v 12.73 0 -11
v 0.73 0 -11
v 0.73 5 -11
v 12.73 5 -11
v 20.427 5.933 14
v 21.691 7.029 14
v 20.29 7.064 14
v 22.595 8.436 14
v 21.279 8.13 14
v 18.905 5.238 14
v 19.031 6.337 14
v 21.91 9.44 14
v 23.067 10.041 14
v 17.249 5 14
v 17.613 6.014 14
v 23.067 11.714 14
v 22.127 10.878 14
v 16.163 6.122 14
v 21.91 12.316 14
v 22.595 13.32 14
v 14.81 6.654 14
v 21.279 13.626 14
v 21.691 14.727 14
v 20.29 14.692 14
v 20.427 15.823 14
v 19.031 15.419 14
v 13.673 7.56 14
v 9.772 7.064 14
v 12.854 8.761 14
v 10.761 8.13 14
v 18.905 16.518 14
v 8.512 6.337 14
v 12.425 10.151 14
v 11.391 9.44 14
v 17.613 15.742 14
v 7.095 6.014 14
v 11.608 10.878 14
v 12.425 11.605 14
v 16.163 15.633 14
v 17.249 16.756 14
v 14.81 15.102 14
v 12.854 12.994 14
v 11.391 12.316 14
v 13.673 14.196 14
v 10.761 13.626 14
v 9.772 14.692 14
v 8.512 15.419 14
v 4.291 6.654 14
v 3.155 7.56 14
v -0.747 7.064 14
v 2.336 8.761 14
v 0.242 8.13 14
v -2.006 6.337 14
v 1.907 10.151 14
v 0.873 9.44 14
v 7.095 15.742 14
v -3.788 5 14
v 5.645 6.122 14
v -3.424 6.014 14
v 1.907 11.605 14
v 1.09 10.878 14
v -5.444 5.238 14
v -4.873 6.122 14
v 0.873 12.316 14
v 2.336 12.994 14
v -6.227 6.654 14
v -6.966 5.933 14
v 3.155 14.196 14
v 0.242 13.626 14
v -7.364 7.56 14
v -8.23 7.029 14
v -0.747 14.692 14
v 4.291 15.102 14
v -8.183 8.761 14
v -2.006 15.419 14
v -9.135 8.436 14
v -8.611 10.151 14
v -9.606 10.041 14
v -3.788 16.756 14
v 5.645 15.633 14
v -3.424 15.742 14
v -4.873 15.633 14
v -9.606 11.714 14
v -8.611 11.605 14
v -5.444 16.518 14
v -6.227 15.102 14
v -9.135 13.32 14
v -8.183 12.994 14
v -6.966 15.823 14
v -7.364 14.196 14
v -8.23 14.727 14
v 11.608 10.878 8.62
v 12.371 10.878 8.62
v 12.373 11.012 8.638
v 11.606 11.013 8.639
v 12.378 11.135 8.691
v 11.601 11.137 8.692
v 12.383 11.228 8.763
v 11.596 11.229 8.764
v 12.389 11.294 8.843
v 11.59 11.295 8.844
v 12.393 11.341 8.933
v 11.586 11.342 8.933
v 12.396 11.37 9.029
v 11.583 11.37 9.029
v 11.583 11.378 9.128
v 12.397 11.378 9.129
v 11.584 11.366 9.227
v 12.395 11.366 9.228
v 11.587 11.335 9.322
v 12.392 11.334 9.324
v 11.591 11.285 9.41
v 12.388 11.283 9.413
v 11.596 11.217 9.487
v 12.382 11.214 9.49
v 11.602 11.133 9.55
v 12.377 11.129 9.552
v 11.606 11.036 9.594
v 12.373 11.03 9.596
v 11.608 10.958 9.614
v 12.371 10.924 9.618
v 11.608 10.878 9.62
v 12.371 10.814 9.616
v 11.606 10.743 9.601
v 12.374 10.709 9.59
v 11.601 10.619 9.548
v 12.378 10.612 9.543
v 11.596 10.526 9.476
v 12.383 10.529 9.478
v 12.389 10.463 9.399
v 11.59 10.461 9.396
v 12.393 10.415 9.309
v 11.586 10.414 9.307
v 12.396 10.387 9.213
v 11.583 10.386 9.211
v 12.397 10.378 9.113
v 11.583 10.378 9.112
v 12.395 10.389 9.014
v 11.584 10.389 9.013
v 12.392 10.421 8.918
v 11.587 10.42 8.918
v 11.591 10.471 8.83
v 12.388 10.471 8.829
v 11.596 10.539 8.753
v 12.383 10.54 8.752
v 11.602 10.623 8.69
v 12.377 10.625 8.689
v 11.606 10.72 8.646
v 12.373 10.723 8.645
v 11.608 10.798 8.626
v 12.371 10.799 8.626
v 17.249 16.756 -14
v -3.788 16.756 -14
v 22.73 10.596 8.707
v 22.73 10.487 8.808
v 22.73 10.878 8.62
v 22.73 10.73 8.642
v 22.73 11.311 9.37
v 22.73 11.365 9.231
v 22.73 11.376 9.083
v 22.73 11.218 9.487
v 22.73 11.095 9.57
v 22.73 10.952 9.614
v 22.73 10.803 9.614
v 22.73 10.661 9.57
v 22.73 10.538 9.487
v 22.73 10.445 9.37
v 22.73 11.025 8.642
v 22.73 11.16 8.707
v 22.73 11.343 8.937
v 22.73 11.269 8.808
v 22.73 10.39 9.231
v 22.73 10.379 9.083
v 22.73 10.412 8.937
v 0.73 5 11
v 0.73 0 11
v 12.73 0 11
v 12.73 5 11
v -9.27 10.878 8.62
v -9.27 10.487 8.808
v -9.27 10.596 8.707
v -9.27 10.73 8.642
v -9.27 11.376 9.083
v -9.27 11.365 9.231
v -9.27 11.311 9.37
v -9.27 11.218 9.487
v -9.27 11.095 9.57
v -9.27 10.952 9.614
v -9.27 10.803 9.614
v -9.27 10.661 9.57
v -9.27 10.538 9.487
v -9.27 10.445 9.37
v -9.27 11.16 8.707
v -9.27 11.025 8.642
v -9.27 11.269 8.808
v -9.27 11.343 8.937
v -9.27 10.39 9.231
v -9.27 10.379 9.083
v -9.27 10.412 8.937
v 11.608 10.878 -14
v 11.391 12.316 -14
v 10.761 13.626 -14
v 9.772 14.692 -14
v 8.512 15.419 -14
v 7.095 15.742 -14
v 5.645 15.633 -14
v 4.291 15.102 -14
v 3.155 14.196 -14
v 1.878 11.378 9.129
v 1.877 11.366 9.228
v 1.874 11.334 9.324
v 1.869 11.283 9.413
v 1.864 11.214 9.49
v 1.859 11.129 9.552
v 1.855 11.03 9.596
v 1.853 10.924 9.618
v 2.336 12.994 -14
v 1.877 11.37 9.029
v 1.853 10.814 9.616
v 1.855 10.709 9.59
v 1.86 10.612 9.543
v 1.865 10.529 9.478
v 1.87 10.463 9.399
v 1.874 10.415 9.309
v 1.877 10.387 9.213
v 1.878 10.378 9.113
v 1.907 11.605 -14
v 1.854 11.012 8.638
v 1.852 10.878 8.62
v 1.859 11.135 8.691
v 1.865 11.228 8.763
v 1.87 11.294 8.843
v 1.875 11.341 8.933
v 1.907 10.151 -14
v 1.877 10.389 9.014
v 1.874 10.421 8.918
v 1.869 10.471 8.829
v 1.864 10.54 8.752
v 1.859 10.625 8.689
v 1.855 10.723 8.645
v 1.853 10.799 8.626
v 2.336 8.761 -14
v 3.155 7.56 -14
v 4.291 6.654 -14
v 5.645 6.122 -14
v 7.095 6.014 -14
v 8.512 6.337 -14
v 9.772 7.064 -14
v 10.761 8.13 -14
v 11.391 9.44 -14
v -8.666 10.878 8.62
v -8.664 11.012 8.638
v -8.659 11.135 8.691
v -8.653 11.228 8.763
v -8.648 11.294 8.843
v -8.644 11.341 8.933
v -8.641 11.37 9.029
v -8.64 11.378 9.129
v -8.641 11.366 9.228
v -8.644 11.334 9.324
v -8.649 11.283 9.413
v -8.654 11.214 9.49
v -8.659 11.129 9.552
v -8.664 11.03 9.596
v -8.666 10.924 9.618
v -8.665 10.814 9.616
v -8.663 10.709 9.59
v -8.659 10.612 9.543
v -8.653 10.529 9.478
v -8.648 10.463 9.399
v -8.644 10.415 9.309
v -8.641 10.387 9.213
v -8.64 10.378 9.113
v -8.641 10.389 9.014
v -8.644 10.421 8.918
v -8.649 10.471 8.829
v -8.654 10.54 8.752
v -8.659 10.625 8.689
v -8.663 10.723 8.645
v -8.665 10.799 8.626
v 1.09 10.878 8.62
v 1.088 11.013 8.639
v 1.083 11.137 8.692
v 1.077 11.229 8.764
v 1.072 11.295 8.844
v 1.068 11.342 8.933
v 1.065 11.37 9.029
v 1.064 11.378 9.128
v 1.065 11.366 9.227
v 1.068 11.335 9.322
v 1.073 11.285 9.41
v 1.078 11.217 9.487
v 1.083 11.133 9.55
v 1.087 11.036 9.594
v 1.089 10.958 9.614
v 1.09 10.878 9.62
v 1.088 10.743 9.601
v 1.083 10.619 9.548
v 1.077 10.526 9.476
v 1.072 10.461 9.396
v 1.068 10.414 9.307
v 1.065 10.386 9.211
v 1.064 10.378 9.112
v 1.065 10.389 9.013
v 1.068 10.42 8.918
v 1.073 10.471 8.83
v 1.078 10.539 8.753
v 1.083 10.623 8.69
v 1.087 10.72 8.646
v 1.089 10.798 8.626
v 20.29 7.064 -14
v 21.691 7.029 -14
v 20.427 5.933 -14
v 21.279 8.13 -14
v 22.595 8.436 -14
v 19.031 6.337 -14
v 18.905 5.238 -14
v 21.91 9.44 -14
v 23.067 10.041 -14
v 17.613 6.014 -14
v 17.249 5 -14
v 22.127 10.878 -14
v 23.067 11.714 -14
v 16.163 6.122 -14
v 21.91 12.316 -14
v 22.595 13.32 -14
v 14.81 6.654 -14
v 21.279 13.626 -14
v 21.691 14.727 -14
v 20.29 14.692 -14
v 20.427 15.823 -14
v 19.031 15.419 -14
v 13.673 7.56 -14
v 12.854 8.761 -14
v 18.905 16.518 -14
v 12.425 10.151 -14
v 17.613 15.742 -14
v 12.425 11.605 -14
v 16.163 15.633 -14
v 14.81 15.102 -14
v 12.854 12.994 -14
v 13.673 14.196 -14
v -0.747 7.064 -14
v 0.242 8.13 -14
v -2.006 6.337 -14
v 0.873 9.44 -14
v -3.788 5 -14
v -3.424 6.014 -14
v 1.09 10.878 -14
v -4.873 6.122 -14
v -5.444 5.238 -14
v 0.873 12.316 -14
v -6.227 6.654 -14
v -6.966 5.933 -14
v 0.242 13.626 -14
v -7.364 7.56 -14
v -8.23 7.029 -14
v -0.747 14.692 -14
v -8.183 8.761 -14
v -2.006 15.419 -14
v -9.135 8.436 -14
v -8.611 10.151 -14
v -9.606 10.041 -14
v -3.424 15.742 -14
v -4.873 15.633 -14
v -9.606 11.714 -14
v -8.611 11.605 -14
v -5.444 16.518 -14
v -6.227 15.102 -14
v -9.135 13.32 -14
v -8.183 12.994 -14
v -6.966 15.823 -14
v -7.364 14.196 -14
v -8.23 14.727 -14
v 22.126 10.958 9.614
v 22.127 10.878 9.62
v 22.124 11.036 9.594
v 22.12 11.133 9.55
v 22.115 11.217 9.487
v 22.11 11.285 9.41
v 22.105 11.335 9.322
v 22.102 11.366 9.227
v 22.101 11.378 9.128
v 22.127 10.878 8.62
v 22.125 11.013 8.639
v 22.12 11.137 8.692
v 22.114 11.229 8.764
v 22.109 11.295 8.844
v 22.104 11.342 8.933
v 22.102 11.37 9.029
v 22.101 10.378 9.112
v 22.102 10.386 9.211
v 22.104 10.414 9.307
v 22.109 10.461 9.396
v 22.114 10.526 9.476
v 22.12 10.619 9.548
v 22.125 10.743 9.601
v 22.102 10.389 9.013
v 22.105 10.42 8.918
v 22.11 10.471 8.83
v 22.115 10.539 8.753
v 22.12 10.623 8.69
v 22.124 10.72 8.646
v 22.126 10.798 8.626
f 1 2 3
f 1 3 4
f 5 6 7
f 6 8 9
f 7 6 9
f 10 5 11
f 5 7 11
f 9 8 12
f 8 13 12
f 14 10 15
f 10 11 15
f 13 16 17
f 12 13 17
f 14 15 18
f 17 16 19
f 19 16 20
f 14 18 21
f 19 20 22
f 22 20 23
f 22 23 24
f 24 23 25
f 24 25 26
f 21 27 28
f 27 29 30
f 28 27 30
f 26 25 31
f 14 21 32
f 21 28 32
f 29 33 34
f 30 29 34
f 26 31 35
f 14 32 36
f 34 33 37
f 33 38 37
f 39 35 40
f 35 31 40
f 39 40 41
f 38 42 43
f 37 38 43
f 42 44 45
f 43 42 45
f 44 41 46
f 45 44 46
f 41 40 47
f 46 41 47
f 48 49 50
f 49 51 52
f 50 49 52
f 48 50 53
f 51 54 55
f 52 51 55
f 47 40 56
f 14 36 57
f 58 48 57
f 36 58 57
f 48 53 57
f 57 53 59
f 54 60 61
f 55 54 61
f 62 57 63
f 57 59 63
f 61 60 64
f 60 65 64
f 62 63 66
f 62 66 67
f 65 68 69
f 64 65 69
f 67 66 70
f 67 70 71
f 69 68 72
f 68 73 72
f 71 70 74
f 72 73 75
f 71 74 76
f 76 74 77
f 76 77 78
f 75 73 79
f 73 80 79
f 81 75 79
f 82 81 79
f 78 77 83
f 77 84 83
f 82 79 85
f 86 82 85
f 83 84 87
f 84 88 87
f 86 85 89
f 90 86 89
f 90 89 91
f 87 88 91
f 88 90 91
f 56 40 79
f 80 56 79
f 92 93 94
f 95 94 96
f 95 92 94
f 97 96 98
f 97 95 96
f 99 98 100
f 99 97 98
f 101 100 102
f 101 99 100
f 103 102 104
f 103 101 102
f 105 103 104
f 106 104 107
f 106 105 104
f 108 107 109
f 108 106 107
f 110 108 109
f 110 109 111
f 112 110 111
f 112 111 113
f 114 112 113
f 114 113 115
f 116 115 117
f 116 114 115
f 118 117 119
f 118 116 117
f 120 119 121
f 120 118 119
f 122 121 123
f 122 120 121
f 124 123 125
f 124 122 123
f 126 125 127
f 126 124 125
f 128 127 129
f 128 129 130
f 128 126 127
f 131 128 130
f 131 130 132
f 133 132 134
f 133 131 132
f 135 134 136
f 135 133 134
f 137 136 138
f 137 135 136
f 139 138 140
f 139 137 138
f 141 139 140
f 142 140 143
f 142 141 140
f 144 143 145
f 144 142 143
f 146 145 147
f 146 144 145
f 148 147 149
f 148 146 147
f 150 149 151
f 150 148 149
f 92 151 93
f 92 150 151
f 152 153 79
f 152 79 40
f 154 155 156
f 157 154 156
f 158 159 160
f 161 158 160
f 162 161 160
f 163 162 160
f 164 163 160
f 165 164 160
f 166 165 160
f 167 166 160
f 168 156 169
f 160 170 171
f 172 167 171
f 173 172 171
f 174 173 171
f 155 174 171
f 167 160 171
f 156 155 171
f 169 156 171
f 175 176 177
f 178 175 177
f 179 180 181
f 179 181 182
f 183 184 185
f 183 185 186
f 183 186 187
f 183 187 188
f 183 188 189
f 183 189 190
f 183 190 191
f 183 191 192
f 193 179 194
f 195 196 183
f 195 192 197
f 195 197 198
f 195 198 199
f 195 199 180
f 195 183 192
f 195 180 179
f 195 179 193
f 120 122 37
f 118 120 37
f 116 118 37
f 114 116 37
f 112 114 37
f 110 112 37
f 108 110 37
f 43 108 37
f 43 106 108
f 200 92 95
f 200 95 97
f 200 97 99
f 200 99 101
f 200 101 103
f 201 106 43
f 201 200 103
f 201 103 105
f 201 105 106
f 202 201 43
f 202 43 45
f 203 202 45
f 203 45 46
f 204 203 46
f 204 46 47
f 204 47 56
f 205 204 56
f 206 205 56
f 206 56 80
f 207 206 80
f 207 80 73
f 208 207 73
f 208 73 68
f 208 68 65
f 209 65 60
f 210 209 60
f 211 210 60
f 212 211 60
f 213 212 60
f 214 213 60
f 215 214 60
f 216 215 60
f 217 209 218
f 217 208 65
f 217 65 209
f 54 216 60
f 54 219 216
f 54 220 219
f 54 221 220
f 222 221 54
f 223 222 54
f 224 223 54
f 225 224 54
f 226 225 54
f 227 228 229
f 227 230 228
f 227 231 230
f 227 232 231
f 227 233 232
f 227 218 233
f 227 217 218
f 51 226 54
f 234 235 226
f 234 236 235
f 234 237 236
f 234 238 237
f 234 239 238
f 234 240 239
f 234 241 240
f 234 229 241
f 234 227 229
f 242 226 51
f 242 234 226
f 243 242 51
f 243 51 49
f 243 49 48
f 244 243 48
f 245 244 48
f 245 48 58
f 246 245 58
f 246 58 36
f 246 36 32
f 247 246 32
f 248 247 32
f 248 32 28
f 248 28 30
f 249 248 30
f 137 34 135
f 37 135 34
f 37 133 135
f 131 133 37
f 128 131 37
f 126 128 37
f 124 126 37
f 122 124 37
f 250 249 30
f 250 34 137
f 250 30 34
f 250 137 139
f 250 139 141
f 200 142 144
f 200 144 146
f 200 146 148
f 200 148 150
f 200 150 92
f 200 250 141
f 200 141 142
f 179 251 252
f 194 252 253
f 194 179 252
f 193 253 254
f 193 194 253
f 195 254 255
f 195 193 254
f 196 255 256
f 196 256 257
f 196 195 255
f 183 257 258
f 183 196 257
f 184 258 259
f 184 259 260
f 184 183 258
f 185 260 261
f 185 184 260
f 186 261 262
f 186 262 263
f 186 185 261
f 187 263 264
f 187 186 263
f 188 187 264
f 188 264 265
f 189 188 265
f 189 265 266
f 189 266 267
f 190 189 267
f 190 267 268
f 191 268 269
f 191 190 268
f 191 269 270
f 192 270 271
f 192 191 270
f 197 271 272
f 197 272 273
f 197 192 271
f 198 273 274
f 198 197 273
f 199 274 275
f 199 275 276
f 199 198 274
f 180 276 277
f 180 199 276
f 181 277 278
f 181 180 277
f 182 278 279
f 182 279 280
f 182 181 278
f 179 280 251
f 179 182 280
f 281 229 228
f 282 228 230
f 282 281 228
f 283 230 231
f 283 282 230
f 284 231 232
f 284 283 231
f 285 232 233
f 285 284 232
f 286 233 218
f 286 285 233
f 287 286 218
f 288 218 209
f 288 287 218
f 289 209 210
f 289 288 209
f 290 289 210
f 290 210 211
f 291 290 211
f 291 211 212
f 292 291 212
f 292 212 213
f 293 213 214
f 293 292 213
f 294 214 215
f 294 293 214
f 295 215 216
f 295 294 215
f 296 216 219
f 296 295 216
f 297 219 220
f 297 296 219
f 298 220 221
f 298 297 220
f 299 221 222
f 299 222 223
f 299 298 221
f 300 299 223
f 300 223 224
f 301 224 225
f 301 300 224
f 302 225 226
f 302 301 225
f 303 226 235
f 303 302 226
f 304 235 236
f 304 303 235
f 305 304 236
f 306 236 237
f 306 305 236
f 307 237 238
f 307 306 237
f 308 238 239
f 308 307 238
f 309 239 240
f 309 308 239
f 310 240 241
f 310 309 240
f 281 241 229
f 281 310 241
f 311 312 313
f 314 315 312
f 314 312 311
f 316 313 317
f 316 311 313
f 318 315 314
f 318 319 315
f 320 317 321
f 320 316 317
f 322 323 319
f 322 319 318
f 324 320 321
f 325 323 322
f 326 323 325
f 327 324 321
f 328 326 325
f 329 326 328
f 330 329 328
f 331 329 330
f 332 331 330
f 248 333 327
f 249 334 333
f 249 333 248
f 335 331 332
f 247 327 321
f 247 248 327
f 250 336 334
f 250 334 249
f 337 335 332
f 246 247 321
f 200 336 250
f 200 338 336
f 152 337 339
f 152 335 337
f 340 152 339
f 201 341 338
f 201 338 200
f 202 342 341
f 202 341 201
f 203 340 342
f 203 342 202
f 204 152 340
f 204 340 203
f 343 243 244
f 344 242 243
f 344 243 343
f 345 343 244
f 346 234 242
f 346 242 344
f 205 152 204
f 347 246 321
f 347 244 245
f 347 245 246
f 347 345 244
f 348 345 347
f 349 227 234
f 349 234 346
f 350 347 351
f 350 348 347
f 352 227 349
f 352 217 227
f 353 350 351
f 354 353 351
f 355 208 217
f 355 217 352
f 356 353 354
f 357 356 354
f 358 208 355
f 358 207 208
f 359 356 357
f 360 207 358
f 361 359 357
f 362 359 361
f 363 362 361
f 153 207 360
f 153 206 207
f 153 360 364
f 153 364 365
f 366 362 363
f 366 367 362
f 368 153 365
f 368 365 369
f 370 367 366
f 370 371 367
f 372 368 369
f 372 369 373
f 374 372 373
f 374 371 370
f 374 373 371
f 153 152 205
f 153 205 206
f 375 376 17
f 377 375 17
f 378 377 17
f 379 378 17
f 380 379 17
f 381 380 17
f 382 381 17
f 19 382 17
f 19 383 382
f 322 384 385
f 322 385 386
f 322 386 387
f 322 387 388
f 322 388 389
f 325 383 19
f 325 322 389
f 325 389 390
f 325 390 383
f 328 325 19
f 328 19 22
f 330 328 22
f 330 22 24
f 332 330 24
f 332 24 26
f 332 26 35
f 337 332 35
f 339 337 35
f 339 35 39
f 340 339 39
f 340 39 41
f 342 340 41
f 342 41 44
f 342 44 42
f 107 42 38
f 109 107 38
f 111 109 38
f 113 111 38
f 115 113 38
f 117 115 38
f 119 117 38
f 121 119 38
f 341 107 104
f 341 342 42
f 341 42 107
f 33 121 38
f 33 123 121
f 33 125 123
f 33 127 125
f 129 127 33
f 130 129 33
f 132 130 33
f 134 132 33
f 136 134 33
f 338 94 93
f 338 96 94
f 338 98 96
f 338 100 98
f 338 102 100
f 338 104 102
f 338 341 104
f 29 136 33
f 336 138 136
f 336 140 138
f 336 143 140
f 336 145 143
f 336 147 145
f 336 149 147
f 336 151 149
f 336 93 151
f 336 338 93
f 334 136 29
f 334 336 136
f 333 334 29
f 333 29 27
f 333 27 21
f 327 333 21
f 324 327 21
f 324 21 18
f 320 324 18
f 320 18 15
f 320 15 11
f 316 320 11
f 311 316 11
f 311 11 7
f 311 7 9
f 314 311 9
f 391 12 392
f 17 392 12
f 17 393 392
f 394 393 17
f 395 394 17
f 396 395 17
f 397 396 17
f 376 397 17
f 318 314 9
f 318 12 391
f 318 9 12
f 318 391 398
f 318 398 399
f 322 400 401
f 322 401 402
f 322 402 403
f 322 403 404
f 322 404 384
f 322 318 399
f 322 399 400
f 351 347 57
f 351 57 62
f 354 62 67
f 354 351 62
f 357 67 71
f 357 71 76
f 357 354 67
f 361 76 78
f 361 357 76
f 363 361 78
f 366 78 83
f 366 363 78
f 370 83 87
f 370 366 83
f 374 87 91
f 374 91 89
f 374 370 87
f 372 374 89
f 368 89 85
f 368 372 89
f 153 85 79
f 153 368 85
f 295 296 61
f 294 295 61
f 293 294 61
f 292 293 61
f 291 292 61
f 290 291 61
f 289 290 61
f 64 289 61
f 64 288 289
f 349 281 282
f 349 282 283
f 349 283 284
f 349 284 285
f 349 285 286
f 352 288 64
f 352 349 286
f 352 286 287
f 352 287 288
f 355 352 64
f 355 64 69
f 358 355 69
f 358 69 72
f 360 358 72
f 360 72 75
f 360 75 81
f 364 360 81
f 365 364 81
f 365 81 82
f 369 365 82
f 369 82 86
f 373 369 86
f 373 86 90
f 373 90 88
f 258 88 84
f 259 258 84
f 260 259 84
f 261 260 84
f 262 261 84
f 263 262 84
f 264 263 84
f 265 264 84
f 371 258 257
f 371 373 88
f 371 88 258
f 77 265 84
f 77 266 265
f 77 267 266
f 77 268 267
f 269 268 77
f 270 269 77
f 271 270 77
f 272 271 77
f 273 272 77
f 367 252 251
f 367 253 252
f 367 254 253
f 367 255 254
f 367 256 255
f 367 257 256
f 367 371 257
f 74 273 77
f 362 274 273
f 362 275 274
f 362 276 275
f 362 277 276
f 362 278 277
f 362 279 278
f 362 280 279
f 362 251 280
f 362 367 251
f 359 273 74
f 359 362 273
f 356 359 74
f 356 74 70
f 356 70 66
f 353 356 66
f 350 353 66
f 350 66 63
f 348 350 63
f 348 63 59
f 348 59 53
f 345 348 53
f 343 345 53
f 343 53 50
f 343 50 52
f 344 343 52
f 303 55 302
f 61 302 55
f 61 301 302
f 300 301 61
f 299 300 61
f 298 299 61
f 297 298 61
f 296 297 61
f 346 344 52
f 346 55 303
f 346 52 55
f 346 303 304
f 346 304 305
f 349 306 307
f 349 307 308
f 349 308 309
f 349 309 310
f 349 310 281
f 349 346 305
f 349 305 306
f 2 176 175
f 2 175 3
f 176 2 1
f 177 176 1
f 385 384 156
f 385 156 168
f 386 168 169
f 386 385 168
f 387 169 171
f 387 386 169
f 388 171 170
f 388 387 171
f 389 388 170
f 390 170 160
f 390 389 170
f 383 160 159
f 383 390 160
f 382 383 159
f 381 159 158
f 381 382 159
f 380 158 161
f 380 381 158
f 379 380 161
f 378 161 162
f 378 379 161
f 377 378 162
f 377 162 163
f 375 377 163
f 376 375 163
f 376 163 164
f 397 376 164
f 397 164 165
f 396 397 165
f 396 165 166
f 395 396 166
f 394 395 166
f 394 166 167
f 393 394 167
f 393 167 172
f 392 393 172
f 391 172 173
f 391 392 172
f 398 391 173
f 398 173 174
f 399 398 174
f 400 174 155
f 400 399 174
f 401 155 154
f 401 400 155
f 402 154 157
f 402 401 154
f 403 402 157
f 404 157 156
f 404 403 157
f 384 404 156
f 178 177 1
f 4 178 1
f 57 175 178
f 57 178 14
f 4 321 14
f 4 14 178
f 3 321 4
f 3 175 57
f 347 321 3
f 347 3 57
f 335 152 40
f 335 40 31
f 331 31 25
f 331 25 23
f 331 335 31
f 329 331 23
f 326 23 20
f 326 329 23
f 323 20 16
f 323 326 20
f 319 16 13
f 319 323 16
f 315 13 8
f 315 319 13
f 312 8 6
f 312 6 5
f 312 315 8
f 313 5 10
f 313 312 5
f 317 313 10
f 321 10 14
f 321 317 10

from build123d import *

# Parameters (mm, degrees)
SKETCH1_W                = 12
SKETCH1_H                = 22
BOSS_EXTRUDE1_DEPTH      = 5
BOSS_EXTRUDE2_DEPTH      = 3
BOSS_EXTRUDE2_DEPTH_BACK = 25
SKETCH2_R                = 4.877853957
CUT_EXTRUDE1_DEPTH       = 16
CUT_EXTRUDE1_DEPTH_BACK  = 16
SKETCH4_R                = 0.5


with BuildPart() as part:
    # Sketch1 → Boss-Extrude1 (new body)
    with BuildSketch(Plane(origin=(0, 0, 0), x_dir=(1, 0, 0), z_dir=(0, 1, 0))):
        with Locations((6.730337079, 0)):
            Rectangle(SKETCH1_W, SKETCH1_H)
    extrude(amount=BOSS_EXTRUDE1_DEPTH)

    # Sketch2 → Boss-Extrude2 (add, two sides: drawn at the far end of the back side and taken through both)
    with BuildSketch(Plane.XY.offset(11).offset(-BOSS_EXTRUDE2_DEPTH_BACK)):
        with BuildLine():
            Line((-3.78803397, 16.755707913), (17.248708128, 16.755707913))
            ThreePointArc((17.248708128, 16.755707913), (23.126562084, 10.877853957), (17.248708128, 5))
            Line((17.248708128, 5), (-3.78803397, 5))
            ThreePointArc((-3.78803397, 5), (-9.665887927, 10.877853957), (-3.78803397, 16.755707913))
        make_face()
        with Locations((17.248708128, 10.877853957)):
            Circle(SKETCH2_R, mode=Mode.SUBTRACT)
        with Locations((6.730337079, 10.877853957)):
            Circle(SKETCH2_R, mode=Mode.SUBTRACT)
        with Locations((-3.78803397, 10.877853957)):
            Circle(SKETCH2_R, mode=Mode.SUBTRACT)
    extrude(amount=BOSS_EXTRUDE2_DEPTH + BOSS_EXTRUDE2_DEPTH_BACK)

    # Sketch4 → Cut-Extrude1 (cut, two sides: drawn at the far end of the back side and taken through both)
    with BuildSketch(Plane(origin=(6.730337079, 0, 0), x_dir=(0, 0, -1), z_dir=(1, 0, 0)).offset(-CUT_EXTRUDE1_DEPTH_BACK)):
        with Locations((-9.12, 10.877853957)):
            Circle(SKETCH4_R)
    extrude(amount=CUT_EXTRUDE1_DEPTH + CUT_EXTRUDE1_DEPTH_BACK, mode=Mode.SUBTRACT)


solid = part.part
